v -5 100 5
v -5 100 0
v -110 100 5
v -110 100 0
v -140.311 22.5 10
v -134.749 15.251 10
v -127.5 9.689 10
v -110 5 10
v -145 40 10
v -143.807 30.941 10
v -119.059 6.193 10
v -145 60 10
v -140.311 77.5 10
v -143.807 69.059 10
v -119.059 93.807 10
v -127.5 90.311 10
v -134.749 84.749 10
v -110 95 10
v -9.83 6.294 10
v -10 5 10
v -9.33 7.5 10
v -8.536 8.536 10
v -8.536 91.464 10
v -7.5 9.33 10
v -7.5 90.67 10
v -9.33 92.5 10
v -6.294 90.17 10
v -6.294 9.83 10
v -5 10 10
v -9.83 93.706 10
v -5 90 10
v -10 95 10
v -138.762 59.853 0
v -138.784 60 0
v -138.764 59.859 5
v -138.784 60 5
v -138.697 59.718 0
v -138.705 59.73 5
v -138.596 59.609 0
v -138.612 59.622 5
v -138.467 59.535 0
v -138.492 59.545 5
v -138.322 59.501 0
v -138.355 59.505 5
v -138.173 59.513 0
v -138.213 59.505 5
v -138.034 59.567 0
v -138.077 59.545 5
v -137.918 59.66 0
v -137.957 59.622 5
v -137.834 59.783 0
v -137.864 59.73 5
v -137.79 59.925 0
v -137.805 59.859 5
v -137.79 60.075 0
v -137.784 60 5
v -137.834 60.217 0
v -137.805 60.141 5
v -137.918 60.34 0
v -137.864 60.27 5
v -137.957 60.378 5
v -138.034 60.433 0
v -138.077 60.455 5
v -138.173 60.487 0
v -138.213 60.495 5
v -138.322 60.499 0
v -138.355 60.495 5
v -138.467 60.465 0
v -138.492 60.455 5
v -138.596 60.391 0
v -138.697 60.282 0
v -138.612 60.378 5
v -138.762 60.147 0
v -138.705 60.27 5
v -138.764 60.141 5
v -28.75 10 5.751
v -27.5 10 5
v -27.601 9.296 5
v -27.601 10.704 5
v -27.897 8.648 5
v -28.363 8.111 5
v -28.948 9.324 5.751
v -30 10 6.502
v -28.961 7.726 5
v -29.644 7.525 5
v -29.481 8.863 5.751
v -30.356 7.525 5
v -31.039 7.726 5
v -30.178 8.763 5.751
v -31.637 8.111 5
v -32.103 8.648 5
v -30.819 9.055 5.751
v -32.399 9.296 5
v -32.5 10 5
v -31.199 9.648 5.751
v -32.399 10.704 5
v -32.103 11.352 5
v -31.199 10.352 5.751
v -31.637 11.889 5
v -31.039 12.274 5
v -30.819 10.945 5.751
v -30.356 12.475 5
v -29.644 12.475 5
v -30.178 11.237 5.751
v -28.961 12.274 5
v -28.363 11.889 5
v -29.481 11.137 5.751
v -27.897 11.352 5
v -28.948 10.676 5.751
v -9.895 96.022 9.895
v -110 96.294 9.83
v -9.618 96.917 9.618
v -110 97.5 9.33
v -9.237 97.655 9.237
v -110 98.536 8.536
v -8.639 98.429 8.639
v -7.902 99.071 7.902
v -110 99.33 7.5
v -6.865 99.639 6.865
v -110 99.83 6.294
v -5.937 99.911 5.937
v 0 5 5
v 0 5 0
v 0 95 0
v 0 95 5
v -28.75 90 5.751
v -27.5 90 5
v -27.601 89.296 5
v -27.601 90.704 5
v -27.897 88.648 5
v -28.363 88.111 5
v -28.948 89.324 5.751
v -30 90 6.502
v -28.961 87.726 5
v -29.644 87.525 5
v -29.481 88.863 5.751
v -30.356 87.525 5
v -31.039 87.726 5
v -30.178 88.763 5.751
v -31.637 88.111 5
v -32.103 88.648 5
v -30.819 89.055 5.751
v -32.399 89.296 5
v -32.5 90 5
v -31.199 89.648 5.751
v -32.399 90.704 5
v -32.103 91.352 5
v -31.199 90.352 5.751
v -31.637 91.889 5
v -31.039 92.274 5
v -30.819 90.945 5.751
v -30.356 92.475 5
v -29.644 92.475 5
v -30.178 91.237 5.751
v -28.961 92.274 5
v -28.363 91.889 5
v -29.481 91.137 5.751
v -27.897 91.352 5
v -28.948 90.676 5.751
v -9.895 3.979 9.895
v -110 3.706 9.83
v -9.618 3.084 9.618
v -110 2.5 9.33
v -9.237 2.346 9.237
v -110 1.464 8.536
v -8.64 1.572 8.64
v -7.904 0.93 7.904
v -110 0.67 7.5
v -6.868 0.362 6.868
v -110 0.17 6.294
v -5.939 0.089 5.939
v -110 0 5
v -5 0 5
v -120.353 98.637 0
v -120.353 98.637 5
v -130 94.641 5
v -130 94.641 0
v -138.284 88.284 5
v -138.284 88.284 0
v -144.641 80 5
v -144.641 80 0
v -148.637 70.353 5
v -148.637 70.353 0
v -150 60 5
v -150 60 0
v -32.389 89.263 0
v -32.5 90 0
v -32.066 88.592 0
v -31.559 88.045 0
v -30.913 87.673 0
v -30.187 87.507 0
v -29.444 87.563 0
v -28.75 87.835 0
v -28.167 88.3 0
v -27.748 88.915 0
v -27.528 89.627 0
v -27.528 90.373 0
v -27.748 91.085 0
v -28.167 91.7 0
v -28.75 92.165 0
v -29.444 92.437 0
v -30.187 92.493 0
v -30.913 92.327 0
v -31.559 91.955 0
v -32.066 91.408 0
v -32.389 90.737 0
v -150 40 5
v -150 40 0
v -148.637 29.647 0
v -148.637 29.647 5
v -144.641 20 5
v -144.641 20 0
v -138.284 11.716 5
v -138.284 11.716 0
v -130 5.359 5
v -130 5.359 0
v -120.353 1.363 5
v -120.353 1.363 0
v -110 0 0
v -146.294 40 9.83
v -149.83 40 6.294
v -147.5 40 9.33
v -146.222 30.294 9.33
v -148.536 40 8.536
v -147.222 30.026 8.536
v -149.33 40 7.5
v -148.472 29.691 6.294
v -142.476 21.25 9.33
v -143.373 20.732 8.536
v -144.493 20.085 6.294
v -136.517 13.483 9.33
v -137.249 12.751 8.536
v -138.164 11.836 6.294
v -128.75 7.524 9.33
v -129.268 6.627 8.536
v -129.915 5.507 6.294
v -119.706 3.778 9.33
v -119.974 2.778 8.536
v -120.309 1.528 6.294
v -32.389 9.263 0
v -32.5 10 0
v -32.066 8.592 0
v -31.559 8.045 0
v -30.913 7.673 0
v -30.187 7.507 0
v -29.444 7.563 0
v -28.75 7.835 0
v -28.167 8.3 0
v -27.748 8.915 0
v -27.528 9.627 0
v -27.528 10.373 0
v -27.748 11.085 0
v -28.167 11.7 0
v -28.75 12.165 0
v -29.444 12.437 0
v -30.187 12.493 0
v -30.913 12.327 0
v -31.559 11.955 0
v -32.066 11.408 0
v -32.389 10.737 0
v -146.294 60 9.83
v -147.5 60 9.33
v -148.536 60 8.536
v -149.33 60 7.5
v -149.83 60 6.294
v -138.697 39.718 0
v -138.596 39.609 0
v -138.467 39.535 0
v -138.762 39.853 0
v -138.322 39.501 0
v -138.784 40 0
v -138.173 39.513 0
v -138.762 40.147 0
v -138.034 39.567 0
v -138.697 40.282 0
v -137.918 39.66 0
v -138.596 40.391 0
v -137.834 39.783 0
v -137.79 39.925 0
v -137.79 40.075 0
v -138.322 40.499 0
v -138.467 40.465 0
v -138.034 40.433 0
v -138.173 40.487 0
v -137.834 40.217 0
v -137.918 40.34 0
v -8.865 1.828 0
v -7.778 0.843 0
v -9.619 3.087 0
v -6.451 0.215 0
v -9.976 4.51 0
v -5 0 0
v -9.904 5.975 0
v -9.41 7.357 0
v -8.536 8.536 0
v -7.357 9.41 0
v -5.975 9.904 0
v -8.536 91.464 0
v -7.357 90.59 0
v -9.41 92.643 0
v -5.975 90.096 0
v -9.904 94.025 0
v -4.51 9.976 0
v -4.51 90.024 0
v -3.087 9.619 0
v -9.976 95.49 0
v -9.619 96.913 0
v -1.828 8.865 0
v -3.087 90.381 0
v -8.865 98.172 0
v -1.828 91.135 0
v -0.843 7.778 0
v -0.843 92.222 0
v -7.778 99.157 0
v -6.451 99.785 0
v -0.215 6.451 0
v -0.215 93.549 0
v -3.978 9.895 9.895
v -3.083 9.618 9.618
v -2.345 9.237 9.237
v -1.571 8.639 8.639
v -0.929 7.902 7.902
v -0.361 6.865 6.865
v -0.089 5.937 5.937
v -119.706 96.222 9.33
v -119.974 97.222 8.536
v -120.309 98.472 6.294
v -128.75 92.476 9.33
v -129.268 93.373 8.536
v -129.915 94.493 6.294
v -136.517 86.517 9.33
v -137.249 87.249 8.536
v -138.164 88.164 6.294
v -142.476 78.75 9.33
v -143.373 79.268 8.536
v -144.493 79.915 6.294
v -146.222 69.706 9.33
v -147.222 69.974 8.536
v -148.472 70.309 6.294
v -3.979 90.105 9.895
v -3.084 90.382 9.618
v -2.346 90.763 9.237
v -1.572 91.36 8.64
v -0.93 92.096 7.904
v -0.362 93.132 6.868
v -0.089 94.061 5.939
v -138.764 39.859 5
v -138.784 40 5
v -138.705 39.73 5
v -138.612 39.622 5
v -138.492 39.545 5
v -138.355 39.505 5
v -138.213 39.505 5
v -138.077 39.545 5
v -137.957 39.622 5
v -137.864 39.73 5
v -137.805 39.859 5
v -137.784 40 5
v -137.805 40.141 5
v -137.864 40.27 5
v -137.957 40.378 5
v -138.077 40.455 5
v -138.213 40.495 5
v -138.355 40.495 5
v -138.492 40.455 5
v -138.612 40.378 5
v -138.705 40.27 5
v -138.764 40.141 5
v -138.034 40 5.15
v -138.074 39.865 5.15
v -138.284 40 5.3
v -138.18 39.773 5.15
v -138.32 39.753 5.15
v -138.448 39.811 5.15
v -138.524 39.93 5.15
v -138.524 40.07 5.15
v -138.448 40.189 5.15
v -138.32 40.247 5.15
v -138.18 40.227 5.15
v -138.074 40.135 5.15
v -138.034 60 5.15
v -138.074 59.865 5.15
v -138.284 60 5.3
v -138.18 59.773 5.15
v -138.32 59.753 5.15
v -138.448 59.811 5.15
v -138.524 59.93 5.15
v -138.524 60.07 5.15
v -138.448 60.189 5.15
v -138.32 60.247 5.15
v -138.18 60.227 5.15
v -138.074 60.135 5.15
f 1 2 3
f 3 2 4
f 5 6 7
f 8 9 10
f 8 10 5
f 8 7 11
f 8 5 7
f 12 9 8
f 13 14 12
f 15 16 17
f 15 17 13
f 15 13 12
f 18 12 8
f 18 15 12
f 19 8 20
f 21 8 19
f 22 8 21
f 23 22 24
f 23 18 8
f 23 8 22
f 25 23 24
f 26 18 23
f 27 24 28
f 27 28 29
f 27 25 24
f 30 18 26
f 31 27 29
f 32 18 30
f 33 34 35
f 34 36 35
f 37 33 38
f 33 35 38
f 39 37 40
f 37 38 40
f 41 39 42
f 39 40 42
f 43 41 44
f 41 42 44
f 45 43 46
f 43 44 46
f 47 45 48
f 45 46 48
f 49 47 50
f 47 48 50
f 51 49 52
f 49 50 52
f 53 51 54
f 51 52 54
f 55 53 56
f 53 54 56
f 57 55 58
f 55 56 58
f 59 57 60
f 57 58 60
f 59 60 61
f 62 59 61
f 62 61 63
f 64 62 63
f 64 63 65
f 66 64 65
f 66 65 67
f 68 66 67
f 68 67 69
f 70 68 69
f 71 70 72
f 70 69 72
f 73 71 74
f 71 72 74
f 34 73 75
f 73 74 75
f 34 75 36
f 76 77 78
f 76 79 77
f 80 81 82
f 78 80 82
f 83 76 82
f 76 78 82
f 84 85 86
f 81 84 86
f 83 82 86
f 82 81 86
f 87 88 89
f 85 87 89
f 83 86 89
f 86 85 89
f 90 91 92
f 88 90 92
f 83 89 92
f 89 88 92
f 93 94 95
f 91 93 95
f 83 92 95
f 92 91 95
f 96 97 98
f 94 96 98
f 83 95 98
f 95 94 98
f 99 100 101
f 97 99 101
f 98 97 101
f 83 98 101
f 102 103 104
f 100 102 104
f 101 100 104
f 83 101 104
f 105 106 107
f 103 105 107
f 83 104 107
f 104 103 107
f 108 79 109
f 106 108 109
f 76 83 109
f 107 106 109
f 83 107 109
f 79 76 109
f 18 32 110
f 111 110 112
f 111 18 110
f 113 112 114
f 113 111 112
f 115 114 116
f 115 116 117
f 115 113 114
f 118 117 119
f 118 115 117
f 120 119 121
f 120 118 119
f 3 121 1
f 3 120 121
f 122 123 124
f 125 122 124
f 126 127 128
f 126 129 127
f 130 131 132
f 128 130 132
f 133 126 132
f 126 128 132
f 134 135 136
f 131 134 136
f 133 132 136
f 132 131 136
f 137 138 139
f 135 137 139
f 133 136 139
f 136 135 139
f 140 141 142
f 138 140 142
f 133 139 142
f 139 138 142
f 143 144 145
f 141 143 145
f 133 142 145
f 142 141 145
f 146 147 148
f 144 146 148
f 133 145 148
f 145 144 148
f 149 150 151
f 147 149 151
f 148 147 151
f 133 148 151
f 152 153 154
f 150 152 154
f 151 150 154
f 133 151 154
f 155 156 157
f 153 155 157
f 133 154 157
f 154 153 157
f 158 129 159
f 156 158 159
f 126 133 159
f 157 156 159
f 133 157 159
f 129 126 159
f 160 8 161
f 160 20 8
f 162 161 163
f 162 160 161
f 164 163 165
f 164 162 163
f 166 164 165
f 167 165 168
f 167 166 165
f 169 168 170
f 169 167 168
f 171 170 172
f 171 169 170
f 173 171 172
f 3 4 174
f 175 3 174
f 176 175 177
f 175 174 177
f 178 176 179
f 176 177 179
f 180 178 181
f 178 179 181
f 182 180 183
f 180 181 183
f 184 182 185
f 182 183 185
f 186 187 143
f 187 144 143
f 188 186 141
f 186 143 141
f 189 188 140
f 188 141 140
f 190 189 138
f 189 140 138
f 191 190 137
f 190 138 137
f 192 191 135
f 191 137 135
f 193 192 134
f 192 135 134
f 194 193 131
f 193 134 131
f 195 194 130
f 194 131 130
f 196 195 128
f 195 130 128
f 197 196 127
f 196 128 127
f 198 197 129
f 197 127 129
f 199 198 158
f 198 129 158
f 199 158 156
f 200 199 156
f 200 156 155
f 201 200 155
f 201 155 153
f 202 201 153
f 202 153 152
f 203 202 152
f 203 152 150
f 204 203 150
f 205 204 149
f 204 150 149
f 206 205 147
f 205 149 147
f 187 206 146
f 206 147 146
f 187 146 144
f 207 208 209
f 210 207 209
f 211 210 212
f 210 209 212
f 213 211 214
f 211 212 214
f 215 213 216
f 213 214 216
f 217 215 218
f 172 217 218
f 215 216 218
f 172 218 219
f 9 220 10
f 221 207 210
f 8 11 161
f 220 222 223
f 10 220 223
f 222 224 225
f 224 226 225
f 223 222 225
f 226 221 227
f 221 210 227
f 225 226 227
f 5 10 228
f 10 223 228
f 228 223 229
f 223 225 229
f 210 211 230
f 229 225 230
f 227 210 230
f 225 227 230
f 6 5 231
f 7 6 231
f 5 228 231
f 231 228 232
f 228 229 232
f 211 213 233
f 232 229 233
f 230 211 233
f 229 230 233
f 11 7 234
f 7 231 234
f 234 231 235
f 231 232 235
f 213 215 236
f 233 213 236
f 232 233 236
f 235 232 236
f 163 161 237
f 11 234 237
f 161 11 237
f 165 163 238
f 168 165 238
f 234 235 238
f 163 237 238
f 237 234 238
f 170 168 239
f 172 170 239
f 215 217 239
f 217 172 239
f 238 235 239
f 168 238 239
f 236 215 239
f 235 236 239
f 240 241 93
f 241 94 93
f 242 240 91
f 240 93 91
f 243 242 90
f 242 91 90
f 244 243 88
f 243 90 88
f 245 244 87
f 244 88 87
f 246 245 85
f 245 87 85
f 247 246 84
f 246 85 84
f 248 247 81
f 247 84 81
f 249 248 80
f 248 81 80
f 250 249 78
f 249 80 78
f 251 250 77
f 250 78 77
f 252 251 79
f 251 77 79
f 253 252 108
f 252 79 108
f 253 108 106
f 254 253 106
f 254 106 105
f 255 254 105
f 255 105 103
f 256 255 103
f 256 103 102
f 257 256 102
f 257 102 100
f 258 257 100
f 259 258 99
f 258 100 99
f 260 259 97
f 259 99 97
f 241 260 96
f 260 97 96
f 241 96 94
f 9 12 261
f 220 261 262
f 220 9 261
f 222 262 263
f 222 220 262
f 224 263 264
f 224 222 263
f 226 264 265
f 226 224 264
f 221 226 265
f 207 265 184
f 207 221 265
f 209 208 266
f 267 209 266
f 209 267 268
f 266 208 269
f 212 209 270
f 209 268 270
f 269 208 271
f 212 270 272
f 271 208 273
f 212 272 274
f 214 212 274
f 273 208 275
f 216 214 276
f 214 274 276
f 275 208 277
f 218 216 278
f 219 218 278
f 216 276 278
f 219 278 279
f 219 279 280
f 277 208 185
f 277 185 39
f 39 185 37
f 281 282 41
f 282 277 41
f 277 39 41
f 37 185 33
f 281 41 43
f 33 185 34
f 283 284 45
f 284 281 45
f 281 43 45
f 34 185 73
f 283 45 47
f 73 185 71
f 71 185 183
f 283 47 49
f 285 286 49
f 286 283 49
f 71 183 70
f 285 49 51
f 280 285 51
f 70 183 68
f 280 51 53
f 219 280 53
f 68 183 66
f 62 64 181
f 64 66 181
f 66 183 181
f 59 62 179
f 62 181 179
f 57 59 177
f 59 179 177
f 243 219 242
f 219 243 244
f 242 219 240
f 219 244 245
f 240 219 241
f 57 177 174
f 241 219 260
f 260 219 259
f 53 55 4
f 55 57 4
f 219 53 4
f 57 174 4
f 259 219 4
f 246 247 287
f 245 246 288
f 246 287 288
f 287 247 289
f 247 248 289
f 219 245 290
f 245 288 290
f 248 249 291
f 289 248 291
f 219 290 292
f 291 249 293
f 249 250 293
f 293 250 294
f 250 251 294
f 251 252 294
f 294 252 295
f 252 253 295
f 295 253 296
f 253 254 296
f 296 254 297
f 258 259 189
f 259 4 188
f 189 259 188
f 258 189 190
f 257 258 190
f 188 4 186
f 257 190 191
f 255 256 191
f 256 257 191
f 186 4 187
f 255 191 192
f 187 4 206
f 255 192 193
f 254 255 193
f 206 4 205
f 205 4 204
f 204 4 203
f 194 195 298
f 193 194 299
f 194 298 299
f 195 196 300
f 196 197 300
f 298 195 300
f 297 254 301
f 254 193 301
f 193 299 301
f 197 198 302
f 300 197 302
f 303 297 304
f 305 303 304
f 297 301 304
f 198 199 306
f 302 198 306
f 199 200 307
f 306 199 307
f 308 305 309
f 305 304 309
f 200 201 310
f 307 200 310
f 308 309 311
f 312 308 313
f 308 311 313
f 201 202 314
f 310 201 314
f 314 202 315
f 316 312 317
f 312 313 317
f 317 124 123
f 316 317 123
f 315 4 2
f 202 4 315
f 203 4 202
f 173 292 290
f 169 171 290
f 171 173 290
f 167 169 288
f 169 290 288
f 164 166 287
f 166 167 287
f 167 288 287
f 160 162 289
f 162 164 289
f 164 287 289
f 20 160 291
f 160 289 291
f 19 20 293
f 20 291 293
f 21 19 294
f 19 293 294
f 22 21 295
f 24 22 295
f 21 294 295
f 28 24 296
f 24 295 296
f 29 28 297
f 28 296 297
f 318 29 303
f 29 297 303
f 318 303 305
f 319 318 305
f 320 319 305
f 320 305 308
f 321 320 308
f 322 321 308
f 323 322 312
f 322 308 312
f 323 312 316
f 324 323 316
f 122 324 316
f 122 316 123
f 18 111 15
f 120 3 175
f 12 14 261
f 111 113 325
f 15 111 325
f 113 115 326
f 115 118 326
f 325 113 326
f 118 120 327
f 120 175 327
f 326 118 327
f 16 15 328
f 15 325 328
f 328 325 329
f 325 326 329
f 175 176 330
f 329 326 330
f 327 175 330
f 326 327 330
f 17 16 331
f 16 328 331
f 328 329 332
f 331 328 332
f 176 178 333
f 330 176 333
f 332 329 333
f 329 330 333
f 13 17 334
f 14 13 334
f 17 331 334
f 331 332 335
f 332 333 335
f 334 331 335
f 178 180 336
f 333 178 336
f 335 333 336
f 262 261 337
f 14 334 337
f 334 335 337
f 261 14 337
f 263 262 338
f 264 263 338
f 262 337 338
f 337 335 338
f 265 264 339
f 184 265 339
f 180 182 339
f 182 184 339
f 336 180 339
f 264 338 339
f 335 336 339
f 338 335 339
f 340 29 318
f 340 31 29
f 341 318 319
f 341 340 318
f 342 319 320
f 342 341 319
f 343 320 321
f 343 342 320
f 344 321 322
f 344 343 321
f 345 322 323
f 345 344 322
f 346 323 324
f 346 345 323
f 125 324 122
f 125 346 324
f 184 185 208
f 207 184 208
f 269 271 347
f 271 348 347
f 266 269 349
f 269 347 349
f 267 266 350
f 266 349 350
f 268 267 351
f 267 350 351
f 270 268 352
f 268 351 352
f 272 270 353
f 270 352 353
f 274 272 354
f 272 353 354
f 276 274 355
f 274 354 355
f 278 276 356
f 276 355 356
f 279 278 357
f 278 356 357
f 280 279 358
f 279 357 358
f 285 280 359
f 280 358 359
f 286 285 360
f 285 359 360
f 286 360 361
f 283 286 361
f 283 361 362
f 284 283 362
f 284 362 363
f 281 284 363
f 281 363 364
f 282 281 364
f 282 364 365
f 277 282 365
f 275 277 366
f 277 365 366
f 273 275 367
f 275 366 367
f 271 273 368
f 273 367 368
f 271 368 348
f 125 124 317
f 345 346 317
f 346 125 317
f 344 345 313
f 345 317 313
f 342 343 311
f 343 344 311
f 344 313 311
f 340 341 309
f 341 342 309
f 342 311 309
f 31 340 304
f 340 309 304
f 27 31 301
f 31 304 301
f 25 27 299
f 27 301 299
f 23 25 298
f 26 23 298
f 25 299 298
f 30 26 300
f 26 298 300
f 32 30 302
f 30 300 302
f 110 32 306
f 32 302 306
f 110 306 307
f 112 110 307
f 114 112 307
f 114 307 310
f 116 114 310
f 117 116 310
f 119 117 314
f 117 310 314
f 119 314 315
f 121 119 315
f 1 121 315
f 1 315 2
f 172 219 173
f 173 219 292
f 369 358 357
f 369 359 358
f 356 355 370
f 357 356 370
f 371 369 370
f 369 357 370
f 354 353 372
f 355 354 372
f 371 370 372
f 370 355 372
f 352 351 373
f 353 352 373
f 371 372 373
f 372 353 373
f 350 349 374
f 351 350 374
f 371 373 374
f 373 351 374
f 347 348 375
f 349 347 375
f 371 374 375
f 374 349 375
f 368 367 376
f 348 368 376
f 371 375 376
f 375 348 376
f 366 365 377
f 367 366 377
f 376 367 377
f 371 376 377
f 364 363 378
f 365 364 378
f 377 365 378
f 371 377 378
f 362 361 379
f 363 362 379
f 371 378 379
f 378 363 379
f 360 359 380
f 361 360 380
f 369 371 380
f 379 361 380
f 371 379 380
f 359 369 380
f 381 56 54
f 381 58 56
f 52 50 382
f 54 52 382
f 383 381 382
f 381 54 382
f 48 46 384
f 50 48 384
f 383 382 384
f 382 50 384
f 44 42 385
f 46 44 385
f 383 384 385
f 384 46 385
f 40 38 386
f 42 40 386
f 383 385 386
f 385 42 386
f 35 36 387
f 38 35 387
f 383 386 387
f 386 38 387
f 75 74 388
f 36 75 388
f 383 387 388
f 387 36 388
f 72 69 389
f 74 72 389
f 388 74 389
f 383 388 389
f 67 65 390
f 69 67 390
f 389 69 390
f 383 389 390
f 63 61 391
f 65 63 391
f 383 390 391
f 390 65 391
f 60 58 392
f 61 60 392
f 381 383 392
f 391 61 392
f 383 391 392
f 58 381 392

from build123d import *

# Parameters (mm, degrees)
F1_DEPTH = 10
F3_D     = 5
F3_DEPTH = 5
F3_TIP   = 1.5021515476
F5_D     = 1
F5_DEPTH = 5
F5_TIP   = 0.3004303095
F6_R     = 5


with BuildPart() as f1:
    # F0 (on Top) → F1 (new body)
    with BuildSketch(Plane.XY):
        with BuildLine():
            Line((-110, 0), (-5, 0))
            ThreePointArc((-5, 0), (-8.5355339059, 8.5355339059), (0, 5))
            Line((0, 5), (0, 95))
            ThreePointArc((0, 95), (-8.5355339059, 91.4644660941), (-5, 100))
            Line((-5, 100), (-110, 100))
            ThreePointArc((-110, 100), (-138.2842712475, 88.2842712475), (-150, 60))
            Line((-150, 60), (-150, 40))
            ThreePointArc((-150, 40), (-138.2842712475, 11.7157287525), (-110, 0))
        make_face()
    extrude(amount=F1_DEPTH)

    # F3
    with Locations(Plane(origin=(0, 0, 0), x_dir=(1, 0, 0), z_dir=(0, 0, -1))):
        with Locations((-30, -10), (-30, -90)):
            Hole(F3_D / 2, depth=F3_DEPTH)
            with Locations((0, 0, -(F3_DEPTH + F3_TIP / 2))):  # 118° drill point
                Cone(0, F3_D / 2, F3_TIP, mode=Mode.SUBTRACT)

    # F5
    with Locations(Plane(origin=(0, 0, 0), x_dir=(1, 0, 0), z_dir=(0, 0, -1))):
        with Locations((-138.2842712475, -40), (-138.2842712475, -60)):
            Hole(F5_D / 2, depth=F5_DEPTH)
            with Locations((0, 0, -(F5_DEPTH + F5_TIP / 2))):  # 118° drill point
                Cone(0, F5_D / 2, F5_TIP, mode=Mode.SUBTRACT)

    # F6
    f6_edges = [f1.edges().sort_by_distance(p)[0] for p in [
        (-57.5, 100, 10),
        (0, 50, 10),
    ]]
    fillet(f6_edges, radius=F6_R)


solid = f1.part
